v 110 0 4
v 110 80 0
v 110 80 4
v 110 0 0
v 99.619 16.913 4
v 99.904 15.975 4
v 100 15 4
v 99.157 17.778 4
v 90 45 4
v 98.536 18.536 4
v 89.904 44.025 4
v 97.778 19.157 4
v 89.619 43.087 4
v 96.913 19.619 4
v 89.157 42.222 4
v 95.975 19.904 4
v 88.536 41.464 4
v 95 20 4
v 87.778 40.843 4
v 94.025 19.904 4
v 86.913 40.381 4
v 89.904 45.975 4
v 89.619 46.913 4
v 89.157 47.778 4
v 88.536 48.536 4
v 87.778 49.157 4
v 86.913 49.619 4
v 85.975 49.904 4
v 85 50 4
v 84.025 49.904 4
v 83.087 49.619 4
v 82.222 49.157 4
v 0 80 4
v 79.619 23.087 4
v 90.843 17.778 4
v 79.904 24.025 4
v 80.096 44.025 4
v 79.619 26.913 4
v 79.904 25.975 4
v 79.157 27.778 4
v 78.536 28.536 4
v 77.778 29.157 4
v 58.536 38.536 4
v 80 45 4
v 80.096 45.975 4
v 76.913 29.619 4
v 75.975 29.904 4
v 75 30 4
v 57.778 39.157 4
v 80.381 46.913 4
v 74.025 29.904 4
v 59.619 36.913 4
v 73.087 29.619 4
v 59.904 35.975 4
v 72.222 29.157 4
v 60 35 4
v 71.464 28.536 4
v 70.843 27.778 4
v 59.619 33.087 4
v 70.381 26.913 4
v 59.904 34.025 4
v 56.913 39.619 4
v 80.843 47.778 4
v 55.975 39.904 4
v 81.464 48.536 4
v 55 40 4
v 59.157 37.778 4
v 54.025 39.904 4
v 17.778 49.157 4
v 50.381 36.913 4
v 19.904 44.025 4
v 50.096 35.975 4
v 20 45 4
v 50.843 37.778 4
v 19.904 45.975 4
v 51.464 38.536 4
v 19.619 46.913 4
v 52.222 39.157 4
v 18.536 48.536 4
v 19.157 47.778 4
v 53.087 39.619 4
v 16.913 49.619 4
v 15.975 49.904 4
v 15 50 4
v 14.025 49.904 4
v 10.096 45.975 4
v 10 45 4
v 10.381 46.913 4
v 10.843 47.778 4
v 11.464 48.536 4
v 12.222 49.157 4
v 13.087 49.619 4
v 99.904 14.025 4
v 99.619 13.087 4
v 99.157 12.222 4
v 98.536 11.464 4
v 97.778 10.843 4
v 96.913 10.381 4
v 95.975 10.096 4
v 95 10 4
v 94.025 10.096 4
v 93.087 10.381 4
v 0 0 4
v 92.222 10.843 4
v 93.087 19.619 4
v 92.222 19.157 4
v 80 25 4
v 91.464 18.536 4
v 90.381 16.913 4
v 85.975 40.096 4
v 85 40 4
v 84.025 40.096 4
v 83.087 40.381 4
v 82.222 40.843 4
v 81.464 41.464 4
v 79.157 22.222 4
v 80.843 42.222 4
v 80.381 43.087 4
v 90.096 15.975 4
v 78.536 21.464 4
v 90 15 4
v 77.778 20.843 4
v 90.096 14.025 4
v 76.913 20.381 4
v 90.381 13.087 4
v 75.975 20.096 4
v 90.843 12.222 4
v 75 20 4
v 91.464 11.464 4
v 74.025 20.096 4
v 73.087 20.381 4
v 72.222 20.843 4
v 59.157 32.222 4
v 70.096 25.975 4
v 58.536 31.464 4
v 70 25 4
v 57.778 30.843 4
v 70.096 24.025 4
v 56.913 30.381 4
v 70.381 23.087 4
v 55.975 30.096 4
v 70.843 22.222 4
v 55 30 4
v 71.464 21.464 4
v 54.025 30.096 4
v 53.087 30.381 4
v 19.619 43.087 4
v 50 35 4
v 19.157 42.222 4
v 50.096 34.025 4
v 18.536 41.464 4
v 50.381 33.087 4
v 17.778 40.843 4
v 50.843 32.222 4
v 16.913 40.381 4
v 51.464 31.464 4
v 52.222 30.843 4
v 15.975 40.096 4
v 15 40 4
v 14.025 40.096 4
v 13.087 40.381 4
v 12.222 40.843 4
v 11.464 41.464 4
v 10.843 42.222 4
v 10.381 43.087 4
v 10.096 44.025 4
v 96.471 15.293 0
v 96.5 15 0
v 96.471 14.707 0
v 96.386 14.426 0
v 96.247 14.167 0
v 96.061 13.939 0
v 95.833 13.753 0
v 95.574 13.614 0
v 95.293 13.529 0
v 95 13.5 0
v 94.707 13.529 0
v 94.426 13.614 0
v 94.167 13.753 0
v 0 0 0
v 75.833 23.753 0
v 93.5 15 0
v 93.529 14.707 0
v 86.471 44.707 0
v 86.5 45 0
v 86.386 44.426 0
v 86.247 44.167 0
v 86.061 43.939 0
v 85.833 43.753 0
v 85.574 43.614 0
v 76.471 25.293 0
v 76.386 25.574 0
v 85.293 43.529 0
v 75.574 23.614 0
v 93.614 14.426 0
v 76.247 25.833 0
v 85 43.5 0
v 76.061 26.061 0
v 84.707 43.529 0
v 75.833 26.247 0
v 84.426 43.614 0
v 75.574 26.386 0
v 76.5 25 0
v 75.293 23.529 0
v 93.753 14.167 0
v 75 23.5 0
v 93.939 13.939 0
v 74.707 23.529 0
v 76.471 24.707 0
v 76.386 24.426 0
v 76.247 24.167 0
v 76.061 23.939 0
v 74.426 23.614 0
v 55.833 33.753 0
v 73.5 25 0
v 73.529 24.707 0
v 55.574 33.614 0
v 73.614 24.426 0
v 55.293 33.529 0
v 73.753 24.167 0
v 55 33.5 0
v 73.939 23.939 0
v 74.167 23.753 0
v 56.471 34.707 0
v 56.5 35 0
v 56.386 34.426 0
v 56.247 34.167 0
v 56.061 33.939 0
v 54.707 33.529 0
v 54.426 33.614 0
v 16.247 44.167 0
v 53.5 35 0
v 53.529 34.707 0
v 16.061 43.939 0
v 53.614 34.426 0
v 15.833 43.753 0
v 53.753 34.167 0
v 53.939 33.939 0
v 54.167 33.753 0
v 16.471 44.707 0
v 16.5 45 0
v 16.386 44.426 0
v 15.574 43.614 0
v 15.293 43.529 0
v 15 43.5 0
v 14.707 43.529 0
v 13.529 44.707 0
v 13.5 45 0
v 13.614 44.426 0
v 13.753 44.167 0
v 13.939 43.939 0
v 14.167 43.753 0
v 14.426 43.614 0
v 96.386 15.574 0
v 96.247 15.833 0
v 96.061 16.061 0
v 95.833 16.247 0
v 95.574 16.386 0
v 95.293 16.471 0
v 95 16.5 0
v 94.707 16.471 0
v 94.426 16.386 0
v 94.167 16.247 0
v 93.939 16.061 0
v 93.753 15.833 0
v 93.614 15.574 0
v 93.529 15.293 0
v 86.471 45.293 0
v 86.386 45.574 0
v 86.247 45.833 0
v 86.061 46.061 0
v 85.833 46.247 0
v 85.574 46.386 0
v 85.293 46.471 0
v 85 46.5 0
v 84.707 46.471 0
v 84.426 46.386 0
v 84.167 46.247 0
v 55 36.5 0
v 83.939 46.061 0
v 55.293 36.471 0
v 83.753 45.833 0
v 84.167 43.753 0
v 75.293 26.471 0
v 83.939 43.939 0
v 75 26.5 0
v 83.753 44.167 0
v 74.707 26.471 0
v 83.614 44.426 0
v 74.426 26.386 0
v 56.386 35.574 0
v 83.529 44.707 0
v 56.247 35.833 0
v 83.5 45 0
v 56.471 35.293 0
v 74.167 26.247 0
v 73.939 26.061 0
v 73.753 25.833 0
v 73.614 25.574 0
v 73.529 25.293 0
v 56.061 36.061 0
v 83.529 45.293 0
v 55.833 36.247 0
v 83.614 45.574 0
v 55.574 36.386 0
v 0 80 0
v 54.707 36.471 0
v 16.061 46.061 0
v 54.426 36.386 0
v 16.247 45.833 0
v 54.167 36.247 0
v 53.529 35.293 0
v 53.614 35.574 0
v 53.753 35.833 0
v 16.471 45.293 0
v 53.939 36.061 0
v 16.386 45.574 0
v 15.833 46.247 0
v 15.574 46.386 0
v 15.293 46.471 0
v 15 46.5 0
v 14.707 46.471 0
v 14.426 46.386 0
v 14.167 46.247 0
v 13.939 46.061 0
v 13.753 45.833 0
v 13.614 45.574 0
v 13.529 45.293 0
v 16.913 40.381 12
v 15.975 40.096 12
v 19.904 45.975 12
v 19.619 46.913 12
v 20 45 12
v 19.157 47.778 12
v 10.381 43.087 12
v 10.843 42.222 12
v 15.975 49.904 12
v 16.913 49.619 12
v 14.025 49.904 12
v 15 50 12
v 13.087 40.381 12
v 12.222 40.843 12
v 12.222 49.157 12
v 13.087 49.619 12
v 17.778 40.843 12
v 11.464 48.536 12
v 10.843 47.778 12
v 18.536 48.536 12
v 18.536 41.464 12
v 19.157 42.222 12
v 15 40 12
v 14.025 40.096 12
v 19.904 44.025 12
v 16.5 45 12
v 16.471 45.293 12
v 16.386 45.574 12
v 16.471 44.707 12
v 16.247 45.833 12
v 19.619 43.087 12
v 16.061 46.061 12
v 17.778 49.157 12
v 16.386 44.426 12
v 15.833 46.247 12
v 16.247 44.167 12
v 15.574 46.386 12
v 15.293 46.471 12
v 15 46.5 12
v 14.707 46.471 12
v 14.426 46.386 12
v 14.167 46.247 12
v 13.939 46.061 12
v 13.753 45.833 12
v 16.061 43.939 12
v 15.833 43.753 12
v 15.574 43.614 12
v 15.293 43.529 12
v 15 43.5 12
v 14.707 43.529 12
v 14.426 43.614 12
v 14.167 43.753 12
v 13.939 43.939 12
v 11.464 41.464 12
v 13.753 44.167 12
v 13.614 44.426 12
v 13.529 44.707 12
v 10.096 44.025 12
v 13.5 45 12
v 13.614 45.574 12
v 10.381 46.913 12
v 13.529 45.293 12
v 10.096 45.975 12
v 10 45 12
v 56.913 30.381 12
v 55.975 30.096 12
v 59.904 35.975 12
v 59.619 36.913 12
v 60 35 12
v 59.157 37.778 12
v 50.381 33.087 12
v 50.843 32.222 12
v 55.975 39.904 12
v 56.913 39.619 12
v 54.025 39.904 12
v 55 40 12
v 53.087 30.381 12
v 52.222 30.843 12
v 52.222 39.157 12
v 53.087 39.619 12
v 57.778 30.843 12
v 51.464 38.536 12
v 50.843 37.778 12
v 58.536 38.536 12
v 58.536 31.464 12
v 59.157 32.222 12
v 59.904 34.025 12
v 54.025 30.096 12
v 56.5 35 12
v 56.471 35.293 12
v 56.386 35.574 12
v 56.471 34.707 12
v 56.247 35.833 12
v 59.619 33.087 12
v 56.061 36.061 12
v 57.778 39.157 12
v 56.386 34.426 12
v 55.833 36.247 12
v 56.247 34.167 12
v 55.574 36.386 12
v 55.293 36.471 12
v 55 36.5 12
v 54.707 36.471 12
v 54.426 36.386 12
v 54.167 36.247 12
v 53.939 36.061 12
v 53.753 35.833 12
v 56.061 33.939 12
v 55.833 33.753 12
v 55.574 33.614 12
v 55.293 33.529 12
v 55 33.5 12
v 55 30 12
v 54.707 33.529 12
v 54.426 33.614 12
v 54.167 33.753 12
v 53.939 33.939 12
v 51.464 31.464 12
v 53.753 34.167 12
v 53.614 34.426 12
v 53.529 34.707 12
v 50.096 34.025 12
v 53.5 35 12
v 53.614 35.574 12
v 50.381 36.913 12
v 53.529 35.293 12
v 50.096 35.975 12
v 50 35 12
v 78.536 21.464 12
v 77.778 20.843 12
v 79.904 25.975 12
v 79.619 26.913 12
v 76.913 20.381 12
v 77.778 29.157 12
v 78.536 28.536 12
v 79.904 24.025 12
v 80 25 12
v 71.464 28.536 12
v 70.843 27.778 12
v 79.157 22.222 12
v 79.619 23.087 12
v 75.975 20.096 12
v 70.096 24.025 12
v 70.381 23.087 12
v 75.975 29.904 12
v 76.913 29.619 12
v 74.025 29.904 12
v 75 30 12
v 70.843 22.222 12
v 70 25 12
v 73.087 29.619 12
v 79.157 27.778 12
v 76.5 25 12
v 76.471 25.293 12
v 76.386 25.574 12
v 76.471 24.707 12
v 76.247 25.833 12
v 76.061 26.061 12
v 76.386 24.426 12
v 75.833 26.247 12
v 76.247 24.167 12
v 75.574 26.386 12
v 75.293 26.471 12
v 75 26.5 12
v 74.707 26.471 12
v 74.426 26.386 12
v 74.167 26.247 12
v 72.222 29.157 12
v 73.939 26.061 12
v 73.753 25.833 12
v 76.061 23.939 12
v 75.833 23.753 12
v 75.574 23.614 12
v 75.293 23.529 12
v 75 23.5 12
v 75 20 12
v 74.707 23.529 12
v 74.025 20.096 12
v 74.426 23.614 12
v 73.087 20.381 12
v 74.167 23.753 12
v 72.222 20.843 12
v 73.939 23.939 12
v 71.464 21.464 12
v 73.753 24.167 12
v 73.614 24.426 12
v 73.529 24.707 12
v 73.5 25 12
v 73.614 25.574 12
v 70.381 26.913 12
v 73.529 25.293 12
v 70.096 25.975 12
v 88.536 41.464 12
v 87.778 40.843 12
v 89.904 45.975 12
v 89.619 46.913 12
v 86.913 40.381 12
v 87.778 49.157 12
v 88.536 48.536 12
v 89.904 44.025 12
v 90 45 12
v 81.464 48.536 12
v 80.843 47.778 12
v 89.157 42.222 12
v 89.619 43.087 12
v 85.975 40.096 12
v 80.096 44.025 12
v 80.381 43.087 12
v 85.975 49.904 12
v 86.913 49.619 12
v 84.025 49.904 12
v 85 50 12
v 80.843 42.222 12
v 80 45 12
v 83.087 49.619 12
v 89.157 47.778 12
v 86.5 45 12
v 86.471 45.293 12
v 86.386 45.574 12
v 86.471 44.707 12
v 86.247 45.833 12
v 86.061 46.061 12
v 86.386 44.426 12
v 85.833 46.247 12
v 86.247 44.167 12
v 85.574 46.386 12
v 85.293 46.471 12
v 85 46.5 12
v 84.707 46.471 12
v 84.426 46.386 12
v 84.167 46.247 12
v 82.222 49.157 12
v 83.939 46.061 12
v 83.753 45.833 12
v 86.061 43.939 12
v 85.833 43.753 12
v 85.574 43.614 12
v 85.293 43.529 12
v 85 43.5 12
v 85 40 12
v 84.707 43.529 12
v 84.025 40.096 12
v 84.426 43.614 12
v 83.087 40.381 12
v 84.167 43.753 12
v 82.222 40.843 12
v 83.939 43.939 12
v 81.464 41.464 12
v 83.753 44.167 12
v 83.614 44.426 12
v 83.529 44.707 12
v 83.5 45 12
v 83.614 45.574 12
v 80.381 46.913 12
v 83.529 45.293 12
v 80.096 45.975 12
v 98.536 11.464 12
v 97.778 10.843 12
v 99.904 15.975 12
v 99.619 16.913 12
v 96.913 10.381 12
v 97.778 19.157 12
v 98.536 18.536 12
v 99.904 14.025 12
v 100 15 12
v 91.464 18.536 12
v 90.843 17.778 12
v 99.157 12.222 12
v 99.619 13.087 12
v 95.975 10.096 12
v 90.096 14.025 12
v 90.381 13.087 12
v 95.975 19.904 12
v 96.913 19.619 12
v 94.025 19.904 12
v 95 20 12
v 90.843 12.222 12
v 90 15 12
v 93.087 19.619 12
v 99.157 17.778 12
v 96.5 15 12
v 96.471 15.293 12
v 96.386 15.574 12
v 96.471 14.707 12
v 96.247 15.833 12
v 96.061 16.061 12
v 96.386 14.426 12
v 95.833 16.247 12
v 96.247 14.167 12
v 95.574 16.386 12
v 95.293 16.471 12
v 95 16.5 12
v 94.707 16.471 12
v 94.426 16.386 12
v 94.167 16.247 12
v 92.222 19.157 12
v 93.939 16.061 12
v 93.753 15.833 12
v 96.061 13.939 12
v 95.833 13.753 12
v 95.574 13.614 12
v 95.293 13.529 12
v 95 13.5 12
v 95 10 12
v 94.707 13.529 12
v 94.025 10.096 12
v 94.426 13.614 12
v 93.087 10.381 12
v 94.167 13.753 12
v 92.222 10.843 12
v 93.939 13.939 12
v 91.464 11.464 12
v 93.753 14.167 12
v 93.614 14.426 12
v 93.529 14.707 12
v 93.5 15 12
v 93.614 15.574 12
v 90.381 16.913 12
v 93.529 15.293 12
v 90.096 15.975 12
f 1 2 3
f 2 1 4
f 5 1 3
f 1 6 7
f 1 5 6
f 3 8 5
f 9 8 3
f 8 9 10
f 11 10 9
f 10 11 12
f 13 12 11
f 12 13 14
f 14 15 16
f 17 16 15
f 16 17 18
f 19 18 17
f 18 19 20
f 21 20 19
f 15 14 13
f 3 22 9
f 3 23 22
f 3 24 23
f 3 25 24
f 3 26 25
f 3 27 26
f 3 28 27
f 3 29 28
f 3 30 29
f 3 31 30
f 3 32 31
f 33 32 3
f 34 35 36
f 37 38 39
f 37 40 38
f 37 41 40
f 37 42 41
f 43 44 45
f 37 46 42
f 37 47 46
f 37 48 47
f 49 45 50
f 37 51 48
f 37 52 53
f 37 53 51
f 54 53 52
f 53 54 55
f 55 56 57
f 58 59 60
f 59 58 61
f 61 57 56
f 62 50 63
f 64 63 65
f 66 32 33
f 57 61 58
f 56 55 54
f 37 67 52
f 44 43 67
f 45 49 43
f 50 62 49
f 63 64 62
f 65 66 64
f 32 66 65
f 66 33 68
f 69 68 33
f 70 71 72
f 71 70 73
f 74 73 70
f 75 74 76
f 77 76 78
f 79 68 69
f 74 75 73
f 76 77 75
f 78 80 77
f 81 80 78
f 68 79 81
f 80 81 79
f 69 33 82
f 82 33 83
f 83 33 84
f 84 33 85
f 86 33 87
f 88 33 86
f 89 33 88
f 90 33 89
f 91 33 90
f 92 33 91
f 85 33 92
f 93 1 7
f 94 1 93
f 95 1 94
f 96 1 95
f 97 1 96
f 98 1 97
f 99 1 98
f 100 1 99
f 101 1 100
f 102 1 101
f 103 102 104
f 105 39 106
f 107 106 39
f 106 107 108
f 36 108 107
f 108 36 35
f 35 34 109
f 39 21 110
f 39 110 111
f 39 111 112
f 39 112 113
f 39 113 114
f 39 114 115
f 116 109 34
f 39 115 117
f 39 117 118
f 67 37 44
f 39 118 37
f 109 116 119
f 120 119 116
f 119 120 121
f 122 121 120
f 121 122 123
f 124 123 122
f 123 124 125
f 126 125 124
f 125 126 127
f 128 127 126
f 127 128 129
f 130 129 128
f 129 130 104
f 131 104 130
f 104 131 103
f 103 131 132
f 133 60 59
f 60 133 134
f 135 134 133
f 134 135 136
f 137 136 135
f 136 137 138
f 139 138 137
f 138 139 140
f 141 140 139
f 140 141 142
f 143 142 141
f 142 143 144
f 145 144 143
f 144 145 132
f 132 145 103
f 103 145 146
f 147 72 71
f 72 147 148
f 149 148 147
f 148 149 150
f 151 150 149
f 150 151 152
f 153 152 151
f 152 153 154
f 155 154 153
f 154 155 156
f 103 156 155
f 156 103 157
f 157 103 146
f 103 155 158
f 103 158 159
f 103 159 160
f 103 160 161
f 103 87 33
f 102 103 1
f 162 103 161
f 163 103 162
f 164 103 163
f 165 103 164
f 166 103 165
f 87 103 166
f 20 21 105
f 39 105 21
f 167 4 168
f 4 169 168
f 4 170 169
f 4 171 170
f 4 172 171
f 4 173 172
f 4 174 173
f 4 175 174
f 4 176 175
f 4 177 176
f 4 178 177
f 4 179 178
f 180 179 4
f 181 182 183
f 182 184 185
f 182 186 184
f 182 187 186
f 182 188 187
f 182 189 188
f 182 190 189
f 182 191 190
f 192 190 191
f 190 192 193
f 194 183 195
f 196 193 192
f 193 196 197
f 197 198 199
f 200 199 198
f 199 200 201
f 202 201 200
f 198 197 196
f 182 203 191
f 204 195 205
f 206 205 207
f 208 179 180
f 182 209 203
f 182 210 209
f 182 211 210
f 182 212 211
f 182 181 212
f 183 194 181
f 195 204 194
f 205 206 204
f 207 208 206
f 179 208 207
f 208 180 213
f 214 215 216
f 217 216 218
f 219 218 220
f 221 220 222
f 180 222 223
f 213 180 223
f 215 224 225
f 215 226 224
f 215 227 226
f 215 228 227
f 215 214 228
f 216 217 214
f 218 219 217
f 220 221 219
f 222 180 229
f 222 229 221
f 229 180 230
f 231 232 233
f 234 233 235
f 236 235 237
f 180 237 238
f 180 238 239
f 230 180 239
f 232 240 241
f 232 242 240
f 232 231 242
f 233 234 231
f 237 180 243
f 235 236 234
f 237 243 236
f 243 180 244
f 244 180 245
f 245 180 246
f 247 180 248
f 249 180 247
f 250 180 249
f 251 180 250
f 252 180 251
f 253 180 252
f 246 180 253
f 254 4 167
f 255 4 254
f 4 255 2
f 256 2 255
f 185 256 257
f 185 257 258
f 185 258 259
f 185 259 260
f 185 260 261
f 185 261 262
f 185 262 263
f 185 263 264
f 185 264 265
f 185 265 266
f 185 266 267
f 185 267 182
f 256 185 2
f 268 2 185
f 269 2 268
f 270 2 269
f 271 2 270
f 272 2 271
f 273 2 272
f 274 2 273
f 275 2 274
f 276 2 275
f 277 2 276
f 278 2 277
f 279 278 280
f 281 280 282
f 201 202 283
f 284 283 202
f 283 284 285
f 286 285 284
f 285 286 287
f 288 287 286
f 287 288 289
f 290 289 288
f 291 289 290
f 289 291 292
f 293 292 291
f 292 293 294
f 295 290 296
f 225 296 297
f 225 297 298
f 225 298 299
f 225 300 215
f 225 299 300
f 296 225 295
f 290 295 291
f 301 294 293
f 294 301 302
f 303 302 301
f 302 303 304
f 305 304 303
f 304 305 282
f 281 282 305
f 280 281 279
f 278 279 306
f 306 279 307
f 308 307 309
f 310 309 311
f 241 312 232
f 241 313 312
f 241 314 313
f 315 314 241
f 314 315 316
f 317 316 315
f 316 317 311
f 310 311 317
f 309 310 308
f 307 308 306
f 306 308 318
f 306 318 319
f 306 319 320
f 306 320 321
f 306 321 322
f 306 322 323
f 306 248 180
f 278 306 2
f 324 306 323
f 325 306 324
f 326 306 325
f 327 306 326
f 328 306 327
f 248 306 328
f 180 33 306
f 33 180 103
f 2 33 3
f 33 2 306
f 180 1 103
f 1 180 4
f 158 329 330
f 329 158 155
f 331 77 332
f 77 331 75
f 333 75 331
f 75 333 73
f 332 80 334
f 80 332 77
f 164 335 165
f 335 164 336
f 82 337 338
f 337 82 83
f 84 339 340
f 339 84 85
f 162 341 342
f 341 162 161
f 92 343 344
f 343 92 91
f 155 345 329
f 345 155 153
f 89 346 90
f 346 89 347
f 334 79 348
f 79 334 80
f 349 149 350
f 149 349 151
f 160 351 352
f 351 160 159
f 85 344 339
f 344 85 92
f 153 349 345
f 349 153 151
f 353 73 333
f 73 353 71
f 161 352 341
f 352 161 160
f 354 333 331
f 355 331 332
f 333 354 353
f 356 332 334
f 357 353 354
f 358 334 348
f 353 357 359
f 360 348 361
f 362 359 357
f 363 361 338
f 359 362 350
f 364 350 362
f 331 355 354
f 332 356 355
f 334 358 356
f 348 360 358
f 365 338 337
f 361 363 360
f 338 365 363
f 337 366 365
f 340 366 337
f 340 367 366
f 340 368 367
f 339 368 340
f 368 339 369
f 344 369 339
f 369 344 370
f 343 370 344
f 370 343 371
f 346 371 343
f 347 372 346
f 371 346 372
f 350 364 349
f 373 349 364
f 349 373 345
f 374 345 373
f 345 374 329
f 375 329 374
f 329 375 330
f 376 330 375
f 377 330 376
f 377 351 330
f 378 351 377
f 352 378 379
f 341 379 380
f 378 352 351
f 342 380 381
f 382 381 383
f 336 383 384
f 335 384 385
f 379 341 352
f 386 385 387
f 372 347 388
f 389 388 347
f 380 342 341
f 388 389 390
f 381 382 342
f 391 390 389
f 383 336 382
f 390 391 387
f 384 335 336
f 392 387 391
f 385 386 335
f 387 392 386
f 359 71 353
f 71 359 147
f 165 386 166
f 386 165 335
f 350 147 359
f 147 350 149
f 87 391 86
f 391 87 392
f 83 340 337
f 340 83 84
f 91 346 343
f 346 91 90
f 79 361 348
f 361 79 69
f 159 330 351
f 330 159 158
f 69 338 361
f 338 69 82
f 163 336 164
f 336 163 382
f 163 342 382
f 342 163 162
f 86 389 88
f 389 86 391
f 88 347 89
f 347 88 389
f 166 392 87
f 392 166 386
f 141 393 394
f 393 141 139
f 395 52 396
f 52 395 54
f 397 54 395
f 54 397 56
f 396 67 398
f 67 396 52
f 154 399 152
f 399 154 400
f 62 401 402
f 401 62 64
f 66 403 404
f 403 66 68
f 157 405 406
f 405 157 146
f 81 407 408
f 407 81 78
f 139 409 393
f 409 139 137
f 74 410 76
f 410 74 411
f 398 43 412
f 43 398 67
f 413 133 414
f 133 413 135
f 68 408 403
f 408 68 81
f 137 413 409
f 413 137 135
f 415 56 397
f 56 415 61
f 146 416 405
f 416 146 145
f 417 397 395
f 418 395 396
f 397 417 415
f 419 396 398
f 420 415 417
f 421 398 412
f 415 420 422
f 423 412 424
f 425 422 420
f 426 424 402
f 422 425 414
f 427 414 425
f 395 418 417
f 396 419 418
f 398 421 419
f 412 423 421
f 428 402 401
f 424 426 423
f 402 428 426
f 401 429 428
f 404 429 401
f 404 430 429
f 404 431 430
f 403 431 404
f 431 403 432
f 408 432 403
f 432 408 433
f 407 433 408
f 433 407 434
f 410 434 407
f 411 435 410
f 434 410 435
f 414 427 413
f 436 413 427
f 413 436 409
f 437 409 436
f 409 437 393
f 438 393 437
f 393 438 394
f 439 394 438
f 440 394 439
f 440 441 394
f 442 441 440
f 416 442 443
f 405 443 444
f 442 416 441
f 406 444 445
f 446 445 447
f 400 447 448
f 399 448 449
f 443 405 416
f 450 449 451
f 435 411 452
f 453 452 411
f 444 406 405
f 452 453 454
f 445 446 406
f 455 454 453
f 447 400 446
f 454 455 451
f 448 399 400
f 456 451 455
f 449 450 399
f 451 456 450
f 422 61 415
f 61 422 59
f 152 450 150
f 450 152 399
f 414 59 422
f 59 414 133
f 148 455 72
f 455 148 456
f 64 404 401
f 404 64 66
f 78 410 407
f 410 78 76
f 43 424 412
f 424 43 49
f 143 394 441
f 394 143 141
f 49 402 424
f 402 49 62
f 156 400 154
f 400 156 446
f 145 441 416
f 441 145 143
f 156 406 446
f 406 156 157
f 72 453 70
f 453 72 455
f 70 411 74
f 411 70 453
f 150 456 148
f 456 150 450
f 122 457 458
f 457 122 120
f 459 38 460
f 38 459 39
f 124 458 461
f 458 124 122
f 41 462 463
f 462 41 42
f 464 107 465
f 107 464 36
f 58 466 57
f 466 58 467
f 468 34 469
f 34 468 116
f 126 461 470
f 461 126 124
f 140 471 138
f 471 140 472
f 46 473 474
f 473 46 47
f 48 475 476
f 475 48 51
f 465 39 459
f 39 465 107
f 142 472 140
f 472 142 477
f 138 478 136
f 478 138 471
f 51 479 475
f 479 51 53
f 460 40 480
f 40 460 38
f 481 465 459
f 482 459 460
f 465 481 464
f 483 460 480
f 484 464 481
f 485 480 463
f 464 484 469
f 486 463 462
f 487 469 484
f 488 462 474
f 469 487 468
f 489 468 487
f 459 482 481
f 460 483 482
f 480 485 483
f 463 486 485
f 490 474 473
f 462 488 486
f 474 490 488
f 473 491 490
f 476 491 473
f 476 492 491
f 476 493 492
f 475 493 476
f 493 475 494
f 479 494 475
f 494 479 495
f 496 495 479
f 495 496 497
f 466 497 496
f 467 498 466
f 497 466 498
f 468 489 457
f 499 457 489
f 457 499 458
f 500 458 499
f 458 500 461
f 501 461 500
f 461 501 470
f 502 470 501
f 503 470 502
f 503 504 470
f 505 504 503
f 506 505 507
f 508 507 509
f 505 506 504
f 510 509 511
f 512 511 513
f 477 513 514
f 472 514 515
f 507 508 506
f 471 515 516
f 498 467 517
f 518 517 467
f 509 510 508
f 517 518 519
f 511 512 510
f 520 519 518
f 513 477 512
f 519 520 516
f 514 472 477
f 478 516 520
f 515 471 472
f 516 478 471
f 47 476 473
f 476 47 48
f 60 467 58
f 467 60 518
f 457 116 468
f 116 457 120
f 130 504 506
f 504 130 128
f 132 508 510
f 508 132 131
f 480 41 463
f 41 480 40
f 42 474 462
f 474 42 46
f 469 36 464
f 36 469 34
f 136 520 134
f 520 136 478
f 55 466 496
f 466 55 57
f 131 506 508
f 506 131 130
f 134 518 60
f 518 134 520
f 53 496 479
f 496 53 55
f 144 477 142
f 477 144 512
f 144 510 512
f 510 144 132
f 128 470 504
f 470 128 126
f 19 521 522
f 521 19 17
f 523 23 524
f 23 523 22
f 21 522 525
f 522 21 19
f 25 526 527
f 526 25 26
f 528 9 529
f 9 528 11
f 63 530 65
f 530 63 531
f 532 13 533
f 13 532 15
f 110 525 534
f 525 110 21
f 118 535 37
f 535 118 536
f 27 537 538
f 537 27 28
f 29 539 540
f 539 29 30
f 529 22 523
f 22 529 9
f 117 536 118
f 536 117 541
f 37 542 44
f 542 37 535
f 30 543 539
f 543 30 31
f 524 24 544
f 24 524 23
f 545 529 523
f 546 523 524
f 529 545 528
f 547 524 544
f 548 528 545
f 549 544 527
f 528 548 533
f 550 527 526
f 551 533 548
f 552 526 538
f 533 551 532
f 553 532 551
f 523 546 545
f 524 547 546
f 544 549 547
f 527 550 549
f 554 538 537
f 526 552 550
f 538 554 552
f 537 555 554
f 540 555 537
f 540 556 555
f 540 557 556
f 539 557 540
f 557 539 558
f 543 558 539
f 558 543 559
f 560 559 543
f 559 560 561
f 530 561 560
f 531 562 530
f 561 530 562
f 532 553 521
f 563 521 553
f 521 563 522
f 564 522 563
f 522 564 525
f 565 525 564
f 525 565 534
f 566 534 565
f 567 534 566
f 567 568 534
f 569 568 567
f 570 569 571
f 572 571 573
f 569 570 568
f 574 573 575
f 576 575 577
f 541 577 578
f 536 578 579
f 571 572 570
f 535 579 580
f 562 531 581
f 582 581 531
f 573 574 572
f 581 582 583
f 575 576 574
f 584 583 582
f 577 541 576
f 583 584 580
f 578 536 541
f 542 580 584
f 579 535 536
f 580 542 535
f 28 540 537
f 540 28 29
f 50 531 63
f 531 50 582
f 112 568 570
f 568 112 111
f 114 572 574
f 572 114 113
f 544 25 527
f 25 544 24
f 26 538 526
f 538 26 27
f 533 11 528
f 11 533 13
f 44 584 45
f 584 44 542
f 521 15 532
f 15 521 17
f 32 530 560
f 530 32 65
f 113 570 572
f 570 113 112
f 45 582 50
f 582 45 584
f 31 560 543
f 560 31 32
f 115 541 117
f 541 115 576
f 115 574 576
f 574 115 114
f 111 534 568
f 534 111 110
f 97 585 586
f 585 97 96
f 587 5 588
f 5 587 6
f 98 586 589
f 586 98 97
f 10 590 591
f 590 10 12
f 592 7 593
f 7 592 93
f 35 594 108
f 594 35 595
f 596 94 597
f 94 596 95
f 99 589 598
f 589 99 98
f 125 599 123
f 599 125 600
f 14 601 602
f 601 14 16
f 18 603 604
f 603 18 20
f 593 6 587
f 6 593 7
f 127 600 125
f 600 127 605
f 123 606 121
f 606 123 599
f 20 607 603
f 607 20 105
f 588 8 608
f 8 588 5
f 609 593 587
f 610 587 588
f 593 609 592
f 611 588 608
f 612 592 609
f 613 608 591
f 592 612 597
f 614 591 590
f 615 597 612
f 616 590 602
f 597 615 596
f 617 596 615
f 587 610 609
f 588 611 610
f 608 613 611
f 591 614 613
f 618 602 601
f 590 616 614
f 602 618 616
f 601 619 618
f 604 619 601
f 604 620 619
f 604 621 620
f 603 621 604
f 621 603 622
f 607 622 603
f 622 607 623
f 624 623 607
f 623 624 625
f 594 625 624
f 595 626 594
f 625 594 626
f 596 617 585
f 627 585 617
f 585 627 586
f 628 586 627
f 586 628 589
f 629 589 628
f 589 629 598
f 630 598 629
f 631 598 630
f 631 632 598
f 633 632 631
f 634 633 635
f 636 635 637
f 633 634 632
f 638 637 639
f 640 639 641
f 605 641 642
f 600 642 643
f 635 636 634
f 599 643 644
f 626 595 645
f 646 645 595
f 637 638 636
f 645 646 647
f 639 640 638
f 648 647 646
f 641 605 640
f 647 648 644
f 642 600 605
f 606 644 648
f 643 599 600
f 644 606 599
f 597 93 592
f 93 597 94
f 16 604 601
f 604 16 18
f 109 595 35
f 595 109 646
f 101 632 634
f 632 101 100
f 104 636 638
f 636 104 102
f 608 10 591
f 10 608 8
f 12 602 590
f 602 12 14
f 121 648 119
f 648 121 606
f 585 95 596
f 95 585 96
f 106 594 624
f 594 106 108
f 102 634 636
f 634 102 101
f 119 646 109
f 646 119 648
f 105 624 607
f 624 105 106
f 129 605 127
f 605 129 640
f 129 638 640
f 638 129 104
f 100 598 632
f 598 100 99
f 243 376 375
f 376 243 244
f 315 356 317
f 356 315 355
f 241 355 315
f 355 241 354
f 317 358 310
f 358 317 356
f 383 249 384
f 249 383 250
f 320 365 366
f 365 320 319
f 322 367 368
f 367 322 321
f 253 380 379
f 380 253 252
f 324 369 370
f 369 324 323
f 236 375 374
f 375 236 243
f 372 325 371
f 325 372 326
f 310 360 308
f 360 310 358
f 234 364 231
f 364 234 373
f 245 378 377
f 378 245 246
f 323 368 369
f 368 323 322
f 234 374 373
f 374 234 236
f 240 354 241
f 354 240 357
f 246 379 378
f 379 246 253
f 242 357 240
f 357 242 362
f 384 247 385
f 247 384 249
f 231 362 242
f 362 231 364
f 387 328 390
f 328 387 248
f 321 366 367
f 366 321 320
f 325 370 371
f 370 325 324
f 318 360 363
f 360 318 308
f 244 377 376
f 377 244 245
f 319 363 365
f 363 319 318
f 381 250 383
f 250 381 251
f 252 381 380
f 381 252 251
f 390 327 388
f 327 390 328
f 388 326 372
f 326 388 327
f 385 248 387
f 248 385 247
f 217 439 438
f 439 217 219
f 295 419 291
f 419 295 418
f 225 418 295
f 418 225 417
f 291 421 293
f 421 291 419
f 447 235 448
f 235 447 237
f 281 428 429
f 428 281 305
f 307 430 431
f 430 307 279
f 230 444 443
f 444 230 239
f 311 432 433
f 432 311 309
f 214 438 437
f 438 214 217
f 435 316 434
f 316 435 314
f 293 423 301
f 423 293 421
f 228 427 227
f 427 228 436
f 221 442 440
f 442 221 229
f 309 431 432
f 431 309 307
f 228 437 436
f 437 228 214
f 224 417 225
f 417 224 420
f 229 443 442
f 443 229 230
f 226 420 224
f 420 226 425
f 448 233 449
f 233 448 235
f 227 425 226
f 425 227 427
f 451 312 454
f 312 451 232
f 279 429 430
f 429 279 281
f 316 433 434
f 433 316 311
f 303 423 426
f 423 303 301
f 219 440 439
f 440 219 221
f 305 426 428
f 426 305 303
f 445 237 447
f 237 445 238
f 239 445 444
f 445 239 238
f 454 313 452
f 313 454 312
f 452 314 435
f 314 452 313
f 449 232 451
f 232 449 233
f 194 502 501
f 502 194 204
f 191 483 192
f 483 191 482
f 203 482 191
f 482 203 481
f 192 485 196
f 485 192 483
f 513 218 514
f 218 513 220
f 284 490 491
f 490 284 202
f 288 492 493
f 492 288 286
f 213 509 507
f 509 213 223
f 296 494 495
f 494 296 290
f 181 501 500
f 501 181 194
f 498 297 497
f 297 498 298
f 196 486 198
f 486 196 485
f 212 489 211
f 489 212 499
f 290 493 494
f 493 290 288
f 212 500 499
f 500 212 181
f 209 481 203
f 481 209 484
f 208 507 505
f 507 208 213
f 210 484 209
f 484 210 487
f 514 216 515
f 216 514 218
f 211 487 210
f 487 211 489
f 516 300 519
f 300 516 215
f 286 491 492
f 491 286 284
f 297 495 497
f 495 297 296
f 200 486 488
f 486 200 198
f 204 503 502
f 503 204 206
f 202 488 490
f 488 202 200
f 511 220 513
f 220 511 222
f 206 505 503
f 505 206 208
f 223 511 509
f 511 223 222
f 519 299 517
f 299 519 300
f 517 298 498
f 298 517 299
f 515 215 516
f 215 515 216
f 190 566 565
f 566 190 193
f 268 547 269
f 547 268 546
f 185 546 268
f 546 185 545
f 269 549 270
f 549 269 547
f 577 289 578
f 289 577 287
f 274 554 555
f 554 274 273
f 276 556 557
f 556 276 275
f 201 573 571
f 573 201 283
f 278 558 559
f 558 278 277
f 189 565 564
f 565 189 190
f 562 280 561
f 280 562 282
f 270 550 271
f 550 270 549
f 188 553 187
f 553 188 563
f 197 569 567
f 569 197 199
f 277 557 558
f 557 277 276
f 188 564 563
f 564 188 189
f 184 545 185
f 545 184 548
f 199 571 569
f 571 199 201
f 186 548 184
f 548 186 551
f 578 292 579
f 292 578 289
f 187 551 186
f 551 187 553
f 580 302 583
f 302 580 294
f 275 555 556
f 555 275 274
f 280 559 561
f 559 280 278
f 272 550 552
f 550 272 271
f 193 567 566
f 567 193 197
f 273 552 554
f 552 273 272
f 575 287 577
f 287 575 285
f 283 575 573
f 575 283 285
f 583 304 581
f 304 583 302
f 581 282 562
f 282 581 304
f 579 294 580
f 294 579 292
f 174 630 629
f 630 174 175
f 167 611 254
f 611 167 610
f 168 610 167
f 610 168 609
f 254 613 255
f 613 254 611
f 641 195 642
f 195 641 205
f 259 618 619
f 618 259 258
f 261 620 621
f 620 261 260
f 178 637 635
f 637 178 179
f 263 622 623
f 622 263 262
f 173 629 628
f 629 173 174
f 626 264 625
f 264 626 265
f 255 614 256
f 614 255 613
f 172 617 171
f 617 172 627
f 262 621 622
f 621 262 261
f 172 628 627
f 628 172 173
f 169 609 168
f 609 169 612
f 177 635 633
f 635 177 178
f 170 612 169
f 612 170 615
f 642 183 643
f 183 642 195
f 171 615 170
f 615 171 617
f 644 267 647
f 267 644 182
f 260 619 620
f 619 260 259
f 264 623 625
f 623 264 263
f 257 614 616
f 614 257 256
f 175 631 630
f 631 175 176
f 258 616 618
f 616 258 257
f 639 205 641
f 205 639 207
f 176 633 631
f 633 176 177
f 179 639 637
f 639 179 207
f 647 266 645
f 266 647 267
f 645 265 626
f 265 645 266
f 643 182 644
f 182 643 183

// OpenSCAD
$fn = 32;

// ----------------------------------------------------------------------
// Boss field: plate with bosses at given coordinates
// ----------------------------------------------------------------------

// --- parameters (mm) ---
plate_l = 110;            // plate length, X
plate_w = 80;             // plate width, Y
plate_t = 4;              // plate thickness, Z
boss_d = 10;              // boss diameter
boss_h = 8;               // boss height above the plate
bore_d = 3;               // boss bore

total_h = plate_t + boss_h;  // overall height

difference() {
  union() {
    cube([plate_l, plate_w, plate_t]);
    translate([15, 45, plate_t]) cylinder(h = boss_h, d = boss_d);
    translate([55, 35, plate_t]) cylinder(h = boss_h, d = boss_d);
    translate([75, 25, plate_t]) cylinder(h = boss_h, d = boss_d);
    translate([85, 45, plate_t]) cylinder(h = boss_h, d = boss_d);
    translate([95, 15, plate_t]) cylinder(h = boss_h, d = boss_d);
  }
  translate([15, 45, -1]) cylinder(h = total_h + 2, d = bore_d);
  translate([55, 35, -1]) cylinder(h = total_h + 2, d = bore_d);
  translate([75, 25, -1]) cylinder(h = total_h + 2, d = bore_d);
  translate([85, 45, -1]) cylinder(h = total_h + 2, d = bore_d);
  translate([95, 15, -1]) cylinder(h = total_h + 2, d = bore_d);
}
